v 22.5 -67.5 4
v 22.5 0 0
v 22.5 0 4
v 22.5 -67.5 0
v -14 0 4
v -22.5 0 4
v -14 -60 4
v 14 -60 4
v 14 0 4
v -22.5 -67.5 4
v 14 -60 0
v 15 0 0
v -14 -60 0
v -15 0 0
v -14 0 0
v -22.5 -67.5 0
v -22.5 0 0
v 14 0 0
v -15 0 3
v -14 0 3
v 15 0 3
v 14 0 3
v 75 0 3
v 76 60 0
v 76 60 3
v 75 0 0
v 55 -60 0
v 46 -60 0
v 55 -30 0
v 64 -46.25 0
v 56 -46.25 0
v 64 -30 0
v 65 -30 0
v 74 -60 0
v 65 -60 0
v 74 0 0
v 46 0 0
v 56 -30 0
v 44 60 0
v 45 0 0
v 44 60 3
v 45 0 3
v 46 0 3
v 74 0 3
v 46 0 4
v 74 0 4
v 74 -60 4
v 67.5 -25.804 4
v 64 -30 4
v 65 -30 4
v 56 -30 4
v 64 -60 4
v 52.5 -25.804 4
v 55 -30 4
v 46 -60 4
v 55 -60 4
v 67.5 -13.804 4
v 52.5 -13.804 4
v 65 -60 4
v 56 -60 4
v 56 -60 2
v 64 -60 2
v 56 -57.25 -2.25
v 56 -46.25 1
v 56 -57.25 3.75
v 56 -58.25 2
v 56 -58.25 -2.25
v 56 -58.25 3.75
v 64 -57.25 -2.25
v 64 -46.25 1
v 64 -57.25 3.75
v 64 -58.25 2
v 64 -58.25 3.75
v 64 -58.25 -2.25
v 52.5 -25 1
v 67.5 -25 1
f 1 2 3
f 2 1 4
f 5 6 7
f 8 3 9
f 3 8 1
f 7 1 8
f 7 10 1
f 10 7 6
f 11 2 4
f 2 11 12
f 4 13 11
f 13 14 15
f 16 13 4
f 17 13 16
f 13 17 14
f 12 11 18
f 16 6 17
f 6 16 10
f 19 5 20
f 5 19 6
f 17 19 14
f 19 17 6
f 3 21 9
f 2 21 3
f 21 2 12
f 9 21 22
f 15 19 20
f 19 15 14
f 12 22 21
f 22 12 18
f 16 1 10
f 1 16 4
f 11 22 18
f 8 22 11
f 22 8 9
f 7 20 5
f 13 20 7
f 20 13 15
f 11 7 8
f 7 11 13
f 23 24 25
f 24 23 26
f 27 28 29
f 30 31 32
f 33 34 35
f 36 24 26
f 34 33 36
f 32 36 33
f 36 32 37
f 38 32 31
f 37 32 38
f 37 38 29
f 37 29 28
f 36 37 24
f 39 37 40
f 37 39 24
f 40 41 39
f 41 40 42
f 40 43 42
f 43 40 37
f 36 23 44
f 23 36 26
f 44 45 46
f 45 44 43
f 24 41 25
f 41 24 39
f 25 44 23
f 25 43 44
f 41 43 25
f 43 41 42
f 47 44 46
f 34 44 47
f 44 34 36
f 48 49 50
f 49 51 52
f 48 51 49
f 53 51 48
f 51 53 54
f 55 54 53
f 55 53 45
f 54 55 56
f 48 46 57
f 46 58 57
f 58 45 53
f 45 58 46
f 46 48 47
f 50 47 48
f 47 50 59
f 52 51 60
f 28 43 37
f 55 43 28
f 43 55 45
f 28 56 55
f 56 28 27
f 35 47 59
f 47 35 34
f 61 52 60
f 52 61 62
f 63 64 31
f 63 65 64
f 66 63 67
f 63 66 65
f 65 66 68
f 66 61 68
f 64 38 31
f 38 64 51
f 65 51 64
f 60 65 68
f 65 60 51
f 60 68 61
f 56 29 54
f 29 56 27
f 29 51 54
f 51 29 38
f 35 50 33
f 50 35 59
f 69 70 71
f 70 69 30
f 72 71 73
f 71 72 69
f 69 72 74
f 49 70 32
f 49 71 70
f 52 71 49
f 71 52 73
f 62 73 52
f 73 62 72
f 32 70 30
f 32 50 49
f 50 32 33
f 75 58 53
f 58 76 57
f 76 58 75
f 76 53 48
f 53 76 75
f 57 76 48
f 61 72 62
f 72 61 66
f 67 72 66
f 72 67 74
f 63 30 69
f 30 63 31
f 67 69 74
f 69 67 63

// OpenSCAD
use <../nscad-lib.scad>

color("orange") abdeckung(x = 30, y = 60);
color("steelblue") move(60) abdeckung_einschub(x = 30, y = 60);
